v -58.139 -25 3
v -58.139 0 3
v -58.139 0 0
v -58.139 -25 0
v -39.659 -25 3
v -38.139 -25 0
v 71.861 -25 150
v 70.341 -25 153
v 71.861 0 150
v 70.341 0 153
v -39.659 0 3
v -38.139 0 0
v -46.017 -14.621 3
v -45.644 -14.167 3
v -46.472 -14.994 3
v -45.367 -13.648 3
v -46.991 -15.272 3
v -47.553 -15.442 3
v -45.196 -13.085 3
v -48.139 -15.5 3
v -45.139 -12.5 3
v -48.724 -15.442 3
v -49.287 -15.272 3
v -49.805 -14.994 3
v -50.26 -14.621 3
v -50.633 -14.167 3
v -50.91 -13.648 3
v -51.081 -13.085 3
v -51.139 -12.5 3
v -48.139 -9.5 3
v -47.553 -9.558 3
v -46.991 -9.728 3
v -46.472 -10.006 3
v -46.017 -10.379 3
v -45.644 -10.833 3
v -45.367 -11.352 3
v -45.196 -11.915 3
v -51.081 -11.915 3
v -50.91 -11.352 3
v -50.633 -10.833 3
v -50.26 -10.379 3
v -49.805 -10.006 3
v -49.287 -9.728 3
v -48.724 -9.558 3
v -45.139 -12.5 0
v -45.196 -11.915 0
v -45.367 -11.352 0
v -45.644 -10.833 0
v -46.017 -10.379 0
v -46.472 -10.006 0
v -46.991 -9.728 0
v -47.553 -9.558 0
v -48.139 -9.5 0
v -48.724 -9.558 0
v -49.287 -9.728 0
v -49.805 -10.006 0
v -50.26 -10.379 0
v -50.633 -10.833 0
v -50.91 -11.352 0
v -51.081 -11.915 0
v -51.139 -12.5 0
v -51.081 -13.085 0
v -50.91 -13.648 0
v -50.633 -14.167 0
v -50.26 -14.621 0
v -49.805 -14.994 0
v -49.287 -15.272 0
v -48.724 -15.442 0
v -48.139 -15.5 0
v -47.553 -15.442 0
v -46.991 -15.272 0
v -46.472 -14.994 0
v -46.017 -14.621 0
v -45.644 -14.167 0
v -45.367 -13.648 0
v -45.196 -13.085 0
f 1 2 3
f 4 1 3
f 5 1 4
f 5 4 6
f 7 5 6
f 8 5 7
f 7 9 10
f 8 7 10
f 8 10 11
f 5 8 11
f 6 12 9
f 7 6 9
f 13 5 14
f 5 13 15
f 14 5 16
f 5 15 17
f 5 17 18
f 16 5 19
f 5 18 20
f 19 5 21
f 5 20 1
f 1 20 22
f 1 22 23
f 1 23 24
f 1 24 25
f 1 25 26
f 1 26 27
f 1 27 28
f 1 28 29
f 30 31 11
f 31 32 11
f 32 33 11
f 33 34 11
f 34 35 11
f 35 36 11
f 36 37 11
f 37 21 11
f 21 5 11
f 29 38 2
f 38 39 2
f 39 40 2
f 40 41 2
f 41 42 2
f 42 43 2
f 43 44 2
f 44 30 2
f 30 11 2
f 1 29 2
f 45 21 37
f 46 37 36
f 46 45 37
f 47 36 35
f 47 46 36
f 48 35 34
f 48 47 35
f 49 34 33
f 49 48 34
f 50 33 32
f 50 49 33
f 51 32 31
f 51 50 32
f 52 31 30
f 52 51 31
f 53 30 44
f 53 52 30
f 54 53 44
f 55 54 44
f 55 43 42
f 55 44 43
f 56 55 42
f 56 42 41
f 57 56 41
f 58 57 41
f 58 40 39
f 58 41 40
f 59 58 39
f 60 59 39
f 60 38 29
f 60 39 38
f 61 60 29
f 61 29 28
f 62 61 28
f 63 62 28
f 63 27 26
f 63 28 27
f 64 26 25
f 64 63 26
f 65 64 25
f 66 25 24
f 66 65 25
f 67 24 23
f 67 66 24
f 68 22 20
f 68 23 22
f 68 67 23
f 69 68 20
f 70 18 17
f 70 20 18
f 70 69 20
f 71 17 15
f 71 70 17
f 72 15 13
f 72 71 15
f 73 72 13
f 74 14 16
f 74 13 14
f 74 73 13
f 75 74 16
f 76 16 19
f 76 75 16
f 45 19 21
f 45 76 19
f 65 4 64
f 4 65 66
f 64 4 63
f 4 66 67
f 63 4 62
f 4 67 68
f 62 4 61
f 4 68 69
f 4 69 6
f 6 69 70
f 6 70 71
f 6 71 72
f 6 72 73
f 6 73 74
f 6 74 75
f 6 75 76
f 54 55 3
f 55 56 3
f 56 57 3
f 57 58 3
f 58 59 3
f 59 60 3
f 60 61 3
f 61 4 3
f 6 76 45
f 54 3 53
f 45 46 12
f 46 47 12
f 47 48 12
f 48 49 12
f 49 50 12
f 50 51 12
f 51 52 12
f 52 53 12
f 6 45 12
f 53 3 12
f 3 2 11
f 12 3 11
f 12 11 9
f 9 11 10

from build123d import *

# Parameters (mm, degrees)
F1_DEPTH = 25
F2_R     = 3
F3_DEPTH = 25


with BuildPart() as f1:
    # F0 (on Front) → F1 (new body)
    with BuildSketch(Plane.XZ):
        Polygon((-58.138707, 3), (-58.138707, 0), (-38.138707, 0), (71.861293, 150), (70.341078, 153), (-39.658922, 3), align=None)
    extrude(amount=F1_DEPTH)

    # F2 (on Top) → F3 (cut)
    with BuildSketch(Plane.XY):
        with Locations((-48.138707, -12.5)):
            Circle(F2_R)
    extrude(amount=F3_DEPTH, mode=Mode.SUBTRACT)


solid = f1.part
